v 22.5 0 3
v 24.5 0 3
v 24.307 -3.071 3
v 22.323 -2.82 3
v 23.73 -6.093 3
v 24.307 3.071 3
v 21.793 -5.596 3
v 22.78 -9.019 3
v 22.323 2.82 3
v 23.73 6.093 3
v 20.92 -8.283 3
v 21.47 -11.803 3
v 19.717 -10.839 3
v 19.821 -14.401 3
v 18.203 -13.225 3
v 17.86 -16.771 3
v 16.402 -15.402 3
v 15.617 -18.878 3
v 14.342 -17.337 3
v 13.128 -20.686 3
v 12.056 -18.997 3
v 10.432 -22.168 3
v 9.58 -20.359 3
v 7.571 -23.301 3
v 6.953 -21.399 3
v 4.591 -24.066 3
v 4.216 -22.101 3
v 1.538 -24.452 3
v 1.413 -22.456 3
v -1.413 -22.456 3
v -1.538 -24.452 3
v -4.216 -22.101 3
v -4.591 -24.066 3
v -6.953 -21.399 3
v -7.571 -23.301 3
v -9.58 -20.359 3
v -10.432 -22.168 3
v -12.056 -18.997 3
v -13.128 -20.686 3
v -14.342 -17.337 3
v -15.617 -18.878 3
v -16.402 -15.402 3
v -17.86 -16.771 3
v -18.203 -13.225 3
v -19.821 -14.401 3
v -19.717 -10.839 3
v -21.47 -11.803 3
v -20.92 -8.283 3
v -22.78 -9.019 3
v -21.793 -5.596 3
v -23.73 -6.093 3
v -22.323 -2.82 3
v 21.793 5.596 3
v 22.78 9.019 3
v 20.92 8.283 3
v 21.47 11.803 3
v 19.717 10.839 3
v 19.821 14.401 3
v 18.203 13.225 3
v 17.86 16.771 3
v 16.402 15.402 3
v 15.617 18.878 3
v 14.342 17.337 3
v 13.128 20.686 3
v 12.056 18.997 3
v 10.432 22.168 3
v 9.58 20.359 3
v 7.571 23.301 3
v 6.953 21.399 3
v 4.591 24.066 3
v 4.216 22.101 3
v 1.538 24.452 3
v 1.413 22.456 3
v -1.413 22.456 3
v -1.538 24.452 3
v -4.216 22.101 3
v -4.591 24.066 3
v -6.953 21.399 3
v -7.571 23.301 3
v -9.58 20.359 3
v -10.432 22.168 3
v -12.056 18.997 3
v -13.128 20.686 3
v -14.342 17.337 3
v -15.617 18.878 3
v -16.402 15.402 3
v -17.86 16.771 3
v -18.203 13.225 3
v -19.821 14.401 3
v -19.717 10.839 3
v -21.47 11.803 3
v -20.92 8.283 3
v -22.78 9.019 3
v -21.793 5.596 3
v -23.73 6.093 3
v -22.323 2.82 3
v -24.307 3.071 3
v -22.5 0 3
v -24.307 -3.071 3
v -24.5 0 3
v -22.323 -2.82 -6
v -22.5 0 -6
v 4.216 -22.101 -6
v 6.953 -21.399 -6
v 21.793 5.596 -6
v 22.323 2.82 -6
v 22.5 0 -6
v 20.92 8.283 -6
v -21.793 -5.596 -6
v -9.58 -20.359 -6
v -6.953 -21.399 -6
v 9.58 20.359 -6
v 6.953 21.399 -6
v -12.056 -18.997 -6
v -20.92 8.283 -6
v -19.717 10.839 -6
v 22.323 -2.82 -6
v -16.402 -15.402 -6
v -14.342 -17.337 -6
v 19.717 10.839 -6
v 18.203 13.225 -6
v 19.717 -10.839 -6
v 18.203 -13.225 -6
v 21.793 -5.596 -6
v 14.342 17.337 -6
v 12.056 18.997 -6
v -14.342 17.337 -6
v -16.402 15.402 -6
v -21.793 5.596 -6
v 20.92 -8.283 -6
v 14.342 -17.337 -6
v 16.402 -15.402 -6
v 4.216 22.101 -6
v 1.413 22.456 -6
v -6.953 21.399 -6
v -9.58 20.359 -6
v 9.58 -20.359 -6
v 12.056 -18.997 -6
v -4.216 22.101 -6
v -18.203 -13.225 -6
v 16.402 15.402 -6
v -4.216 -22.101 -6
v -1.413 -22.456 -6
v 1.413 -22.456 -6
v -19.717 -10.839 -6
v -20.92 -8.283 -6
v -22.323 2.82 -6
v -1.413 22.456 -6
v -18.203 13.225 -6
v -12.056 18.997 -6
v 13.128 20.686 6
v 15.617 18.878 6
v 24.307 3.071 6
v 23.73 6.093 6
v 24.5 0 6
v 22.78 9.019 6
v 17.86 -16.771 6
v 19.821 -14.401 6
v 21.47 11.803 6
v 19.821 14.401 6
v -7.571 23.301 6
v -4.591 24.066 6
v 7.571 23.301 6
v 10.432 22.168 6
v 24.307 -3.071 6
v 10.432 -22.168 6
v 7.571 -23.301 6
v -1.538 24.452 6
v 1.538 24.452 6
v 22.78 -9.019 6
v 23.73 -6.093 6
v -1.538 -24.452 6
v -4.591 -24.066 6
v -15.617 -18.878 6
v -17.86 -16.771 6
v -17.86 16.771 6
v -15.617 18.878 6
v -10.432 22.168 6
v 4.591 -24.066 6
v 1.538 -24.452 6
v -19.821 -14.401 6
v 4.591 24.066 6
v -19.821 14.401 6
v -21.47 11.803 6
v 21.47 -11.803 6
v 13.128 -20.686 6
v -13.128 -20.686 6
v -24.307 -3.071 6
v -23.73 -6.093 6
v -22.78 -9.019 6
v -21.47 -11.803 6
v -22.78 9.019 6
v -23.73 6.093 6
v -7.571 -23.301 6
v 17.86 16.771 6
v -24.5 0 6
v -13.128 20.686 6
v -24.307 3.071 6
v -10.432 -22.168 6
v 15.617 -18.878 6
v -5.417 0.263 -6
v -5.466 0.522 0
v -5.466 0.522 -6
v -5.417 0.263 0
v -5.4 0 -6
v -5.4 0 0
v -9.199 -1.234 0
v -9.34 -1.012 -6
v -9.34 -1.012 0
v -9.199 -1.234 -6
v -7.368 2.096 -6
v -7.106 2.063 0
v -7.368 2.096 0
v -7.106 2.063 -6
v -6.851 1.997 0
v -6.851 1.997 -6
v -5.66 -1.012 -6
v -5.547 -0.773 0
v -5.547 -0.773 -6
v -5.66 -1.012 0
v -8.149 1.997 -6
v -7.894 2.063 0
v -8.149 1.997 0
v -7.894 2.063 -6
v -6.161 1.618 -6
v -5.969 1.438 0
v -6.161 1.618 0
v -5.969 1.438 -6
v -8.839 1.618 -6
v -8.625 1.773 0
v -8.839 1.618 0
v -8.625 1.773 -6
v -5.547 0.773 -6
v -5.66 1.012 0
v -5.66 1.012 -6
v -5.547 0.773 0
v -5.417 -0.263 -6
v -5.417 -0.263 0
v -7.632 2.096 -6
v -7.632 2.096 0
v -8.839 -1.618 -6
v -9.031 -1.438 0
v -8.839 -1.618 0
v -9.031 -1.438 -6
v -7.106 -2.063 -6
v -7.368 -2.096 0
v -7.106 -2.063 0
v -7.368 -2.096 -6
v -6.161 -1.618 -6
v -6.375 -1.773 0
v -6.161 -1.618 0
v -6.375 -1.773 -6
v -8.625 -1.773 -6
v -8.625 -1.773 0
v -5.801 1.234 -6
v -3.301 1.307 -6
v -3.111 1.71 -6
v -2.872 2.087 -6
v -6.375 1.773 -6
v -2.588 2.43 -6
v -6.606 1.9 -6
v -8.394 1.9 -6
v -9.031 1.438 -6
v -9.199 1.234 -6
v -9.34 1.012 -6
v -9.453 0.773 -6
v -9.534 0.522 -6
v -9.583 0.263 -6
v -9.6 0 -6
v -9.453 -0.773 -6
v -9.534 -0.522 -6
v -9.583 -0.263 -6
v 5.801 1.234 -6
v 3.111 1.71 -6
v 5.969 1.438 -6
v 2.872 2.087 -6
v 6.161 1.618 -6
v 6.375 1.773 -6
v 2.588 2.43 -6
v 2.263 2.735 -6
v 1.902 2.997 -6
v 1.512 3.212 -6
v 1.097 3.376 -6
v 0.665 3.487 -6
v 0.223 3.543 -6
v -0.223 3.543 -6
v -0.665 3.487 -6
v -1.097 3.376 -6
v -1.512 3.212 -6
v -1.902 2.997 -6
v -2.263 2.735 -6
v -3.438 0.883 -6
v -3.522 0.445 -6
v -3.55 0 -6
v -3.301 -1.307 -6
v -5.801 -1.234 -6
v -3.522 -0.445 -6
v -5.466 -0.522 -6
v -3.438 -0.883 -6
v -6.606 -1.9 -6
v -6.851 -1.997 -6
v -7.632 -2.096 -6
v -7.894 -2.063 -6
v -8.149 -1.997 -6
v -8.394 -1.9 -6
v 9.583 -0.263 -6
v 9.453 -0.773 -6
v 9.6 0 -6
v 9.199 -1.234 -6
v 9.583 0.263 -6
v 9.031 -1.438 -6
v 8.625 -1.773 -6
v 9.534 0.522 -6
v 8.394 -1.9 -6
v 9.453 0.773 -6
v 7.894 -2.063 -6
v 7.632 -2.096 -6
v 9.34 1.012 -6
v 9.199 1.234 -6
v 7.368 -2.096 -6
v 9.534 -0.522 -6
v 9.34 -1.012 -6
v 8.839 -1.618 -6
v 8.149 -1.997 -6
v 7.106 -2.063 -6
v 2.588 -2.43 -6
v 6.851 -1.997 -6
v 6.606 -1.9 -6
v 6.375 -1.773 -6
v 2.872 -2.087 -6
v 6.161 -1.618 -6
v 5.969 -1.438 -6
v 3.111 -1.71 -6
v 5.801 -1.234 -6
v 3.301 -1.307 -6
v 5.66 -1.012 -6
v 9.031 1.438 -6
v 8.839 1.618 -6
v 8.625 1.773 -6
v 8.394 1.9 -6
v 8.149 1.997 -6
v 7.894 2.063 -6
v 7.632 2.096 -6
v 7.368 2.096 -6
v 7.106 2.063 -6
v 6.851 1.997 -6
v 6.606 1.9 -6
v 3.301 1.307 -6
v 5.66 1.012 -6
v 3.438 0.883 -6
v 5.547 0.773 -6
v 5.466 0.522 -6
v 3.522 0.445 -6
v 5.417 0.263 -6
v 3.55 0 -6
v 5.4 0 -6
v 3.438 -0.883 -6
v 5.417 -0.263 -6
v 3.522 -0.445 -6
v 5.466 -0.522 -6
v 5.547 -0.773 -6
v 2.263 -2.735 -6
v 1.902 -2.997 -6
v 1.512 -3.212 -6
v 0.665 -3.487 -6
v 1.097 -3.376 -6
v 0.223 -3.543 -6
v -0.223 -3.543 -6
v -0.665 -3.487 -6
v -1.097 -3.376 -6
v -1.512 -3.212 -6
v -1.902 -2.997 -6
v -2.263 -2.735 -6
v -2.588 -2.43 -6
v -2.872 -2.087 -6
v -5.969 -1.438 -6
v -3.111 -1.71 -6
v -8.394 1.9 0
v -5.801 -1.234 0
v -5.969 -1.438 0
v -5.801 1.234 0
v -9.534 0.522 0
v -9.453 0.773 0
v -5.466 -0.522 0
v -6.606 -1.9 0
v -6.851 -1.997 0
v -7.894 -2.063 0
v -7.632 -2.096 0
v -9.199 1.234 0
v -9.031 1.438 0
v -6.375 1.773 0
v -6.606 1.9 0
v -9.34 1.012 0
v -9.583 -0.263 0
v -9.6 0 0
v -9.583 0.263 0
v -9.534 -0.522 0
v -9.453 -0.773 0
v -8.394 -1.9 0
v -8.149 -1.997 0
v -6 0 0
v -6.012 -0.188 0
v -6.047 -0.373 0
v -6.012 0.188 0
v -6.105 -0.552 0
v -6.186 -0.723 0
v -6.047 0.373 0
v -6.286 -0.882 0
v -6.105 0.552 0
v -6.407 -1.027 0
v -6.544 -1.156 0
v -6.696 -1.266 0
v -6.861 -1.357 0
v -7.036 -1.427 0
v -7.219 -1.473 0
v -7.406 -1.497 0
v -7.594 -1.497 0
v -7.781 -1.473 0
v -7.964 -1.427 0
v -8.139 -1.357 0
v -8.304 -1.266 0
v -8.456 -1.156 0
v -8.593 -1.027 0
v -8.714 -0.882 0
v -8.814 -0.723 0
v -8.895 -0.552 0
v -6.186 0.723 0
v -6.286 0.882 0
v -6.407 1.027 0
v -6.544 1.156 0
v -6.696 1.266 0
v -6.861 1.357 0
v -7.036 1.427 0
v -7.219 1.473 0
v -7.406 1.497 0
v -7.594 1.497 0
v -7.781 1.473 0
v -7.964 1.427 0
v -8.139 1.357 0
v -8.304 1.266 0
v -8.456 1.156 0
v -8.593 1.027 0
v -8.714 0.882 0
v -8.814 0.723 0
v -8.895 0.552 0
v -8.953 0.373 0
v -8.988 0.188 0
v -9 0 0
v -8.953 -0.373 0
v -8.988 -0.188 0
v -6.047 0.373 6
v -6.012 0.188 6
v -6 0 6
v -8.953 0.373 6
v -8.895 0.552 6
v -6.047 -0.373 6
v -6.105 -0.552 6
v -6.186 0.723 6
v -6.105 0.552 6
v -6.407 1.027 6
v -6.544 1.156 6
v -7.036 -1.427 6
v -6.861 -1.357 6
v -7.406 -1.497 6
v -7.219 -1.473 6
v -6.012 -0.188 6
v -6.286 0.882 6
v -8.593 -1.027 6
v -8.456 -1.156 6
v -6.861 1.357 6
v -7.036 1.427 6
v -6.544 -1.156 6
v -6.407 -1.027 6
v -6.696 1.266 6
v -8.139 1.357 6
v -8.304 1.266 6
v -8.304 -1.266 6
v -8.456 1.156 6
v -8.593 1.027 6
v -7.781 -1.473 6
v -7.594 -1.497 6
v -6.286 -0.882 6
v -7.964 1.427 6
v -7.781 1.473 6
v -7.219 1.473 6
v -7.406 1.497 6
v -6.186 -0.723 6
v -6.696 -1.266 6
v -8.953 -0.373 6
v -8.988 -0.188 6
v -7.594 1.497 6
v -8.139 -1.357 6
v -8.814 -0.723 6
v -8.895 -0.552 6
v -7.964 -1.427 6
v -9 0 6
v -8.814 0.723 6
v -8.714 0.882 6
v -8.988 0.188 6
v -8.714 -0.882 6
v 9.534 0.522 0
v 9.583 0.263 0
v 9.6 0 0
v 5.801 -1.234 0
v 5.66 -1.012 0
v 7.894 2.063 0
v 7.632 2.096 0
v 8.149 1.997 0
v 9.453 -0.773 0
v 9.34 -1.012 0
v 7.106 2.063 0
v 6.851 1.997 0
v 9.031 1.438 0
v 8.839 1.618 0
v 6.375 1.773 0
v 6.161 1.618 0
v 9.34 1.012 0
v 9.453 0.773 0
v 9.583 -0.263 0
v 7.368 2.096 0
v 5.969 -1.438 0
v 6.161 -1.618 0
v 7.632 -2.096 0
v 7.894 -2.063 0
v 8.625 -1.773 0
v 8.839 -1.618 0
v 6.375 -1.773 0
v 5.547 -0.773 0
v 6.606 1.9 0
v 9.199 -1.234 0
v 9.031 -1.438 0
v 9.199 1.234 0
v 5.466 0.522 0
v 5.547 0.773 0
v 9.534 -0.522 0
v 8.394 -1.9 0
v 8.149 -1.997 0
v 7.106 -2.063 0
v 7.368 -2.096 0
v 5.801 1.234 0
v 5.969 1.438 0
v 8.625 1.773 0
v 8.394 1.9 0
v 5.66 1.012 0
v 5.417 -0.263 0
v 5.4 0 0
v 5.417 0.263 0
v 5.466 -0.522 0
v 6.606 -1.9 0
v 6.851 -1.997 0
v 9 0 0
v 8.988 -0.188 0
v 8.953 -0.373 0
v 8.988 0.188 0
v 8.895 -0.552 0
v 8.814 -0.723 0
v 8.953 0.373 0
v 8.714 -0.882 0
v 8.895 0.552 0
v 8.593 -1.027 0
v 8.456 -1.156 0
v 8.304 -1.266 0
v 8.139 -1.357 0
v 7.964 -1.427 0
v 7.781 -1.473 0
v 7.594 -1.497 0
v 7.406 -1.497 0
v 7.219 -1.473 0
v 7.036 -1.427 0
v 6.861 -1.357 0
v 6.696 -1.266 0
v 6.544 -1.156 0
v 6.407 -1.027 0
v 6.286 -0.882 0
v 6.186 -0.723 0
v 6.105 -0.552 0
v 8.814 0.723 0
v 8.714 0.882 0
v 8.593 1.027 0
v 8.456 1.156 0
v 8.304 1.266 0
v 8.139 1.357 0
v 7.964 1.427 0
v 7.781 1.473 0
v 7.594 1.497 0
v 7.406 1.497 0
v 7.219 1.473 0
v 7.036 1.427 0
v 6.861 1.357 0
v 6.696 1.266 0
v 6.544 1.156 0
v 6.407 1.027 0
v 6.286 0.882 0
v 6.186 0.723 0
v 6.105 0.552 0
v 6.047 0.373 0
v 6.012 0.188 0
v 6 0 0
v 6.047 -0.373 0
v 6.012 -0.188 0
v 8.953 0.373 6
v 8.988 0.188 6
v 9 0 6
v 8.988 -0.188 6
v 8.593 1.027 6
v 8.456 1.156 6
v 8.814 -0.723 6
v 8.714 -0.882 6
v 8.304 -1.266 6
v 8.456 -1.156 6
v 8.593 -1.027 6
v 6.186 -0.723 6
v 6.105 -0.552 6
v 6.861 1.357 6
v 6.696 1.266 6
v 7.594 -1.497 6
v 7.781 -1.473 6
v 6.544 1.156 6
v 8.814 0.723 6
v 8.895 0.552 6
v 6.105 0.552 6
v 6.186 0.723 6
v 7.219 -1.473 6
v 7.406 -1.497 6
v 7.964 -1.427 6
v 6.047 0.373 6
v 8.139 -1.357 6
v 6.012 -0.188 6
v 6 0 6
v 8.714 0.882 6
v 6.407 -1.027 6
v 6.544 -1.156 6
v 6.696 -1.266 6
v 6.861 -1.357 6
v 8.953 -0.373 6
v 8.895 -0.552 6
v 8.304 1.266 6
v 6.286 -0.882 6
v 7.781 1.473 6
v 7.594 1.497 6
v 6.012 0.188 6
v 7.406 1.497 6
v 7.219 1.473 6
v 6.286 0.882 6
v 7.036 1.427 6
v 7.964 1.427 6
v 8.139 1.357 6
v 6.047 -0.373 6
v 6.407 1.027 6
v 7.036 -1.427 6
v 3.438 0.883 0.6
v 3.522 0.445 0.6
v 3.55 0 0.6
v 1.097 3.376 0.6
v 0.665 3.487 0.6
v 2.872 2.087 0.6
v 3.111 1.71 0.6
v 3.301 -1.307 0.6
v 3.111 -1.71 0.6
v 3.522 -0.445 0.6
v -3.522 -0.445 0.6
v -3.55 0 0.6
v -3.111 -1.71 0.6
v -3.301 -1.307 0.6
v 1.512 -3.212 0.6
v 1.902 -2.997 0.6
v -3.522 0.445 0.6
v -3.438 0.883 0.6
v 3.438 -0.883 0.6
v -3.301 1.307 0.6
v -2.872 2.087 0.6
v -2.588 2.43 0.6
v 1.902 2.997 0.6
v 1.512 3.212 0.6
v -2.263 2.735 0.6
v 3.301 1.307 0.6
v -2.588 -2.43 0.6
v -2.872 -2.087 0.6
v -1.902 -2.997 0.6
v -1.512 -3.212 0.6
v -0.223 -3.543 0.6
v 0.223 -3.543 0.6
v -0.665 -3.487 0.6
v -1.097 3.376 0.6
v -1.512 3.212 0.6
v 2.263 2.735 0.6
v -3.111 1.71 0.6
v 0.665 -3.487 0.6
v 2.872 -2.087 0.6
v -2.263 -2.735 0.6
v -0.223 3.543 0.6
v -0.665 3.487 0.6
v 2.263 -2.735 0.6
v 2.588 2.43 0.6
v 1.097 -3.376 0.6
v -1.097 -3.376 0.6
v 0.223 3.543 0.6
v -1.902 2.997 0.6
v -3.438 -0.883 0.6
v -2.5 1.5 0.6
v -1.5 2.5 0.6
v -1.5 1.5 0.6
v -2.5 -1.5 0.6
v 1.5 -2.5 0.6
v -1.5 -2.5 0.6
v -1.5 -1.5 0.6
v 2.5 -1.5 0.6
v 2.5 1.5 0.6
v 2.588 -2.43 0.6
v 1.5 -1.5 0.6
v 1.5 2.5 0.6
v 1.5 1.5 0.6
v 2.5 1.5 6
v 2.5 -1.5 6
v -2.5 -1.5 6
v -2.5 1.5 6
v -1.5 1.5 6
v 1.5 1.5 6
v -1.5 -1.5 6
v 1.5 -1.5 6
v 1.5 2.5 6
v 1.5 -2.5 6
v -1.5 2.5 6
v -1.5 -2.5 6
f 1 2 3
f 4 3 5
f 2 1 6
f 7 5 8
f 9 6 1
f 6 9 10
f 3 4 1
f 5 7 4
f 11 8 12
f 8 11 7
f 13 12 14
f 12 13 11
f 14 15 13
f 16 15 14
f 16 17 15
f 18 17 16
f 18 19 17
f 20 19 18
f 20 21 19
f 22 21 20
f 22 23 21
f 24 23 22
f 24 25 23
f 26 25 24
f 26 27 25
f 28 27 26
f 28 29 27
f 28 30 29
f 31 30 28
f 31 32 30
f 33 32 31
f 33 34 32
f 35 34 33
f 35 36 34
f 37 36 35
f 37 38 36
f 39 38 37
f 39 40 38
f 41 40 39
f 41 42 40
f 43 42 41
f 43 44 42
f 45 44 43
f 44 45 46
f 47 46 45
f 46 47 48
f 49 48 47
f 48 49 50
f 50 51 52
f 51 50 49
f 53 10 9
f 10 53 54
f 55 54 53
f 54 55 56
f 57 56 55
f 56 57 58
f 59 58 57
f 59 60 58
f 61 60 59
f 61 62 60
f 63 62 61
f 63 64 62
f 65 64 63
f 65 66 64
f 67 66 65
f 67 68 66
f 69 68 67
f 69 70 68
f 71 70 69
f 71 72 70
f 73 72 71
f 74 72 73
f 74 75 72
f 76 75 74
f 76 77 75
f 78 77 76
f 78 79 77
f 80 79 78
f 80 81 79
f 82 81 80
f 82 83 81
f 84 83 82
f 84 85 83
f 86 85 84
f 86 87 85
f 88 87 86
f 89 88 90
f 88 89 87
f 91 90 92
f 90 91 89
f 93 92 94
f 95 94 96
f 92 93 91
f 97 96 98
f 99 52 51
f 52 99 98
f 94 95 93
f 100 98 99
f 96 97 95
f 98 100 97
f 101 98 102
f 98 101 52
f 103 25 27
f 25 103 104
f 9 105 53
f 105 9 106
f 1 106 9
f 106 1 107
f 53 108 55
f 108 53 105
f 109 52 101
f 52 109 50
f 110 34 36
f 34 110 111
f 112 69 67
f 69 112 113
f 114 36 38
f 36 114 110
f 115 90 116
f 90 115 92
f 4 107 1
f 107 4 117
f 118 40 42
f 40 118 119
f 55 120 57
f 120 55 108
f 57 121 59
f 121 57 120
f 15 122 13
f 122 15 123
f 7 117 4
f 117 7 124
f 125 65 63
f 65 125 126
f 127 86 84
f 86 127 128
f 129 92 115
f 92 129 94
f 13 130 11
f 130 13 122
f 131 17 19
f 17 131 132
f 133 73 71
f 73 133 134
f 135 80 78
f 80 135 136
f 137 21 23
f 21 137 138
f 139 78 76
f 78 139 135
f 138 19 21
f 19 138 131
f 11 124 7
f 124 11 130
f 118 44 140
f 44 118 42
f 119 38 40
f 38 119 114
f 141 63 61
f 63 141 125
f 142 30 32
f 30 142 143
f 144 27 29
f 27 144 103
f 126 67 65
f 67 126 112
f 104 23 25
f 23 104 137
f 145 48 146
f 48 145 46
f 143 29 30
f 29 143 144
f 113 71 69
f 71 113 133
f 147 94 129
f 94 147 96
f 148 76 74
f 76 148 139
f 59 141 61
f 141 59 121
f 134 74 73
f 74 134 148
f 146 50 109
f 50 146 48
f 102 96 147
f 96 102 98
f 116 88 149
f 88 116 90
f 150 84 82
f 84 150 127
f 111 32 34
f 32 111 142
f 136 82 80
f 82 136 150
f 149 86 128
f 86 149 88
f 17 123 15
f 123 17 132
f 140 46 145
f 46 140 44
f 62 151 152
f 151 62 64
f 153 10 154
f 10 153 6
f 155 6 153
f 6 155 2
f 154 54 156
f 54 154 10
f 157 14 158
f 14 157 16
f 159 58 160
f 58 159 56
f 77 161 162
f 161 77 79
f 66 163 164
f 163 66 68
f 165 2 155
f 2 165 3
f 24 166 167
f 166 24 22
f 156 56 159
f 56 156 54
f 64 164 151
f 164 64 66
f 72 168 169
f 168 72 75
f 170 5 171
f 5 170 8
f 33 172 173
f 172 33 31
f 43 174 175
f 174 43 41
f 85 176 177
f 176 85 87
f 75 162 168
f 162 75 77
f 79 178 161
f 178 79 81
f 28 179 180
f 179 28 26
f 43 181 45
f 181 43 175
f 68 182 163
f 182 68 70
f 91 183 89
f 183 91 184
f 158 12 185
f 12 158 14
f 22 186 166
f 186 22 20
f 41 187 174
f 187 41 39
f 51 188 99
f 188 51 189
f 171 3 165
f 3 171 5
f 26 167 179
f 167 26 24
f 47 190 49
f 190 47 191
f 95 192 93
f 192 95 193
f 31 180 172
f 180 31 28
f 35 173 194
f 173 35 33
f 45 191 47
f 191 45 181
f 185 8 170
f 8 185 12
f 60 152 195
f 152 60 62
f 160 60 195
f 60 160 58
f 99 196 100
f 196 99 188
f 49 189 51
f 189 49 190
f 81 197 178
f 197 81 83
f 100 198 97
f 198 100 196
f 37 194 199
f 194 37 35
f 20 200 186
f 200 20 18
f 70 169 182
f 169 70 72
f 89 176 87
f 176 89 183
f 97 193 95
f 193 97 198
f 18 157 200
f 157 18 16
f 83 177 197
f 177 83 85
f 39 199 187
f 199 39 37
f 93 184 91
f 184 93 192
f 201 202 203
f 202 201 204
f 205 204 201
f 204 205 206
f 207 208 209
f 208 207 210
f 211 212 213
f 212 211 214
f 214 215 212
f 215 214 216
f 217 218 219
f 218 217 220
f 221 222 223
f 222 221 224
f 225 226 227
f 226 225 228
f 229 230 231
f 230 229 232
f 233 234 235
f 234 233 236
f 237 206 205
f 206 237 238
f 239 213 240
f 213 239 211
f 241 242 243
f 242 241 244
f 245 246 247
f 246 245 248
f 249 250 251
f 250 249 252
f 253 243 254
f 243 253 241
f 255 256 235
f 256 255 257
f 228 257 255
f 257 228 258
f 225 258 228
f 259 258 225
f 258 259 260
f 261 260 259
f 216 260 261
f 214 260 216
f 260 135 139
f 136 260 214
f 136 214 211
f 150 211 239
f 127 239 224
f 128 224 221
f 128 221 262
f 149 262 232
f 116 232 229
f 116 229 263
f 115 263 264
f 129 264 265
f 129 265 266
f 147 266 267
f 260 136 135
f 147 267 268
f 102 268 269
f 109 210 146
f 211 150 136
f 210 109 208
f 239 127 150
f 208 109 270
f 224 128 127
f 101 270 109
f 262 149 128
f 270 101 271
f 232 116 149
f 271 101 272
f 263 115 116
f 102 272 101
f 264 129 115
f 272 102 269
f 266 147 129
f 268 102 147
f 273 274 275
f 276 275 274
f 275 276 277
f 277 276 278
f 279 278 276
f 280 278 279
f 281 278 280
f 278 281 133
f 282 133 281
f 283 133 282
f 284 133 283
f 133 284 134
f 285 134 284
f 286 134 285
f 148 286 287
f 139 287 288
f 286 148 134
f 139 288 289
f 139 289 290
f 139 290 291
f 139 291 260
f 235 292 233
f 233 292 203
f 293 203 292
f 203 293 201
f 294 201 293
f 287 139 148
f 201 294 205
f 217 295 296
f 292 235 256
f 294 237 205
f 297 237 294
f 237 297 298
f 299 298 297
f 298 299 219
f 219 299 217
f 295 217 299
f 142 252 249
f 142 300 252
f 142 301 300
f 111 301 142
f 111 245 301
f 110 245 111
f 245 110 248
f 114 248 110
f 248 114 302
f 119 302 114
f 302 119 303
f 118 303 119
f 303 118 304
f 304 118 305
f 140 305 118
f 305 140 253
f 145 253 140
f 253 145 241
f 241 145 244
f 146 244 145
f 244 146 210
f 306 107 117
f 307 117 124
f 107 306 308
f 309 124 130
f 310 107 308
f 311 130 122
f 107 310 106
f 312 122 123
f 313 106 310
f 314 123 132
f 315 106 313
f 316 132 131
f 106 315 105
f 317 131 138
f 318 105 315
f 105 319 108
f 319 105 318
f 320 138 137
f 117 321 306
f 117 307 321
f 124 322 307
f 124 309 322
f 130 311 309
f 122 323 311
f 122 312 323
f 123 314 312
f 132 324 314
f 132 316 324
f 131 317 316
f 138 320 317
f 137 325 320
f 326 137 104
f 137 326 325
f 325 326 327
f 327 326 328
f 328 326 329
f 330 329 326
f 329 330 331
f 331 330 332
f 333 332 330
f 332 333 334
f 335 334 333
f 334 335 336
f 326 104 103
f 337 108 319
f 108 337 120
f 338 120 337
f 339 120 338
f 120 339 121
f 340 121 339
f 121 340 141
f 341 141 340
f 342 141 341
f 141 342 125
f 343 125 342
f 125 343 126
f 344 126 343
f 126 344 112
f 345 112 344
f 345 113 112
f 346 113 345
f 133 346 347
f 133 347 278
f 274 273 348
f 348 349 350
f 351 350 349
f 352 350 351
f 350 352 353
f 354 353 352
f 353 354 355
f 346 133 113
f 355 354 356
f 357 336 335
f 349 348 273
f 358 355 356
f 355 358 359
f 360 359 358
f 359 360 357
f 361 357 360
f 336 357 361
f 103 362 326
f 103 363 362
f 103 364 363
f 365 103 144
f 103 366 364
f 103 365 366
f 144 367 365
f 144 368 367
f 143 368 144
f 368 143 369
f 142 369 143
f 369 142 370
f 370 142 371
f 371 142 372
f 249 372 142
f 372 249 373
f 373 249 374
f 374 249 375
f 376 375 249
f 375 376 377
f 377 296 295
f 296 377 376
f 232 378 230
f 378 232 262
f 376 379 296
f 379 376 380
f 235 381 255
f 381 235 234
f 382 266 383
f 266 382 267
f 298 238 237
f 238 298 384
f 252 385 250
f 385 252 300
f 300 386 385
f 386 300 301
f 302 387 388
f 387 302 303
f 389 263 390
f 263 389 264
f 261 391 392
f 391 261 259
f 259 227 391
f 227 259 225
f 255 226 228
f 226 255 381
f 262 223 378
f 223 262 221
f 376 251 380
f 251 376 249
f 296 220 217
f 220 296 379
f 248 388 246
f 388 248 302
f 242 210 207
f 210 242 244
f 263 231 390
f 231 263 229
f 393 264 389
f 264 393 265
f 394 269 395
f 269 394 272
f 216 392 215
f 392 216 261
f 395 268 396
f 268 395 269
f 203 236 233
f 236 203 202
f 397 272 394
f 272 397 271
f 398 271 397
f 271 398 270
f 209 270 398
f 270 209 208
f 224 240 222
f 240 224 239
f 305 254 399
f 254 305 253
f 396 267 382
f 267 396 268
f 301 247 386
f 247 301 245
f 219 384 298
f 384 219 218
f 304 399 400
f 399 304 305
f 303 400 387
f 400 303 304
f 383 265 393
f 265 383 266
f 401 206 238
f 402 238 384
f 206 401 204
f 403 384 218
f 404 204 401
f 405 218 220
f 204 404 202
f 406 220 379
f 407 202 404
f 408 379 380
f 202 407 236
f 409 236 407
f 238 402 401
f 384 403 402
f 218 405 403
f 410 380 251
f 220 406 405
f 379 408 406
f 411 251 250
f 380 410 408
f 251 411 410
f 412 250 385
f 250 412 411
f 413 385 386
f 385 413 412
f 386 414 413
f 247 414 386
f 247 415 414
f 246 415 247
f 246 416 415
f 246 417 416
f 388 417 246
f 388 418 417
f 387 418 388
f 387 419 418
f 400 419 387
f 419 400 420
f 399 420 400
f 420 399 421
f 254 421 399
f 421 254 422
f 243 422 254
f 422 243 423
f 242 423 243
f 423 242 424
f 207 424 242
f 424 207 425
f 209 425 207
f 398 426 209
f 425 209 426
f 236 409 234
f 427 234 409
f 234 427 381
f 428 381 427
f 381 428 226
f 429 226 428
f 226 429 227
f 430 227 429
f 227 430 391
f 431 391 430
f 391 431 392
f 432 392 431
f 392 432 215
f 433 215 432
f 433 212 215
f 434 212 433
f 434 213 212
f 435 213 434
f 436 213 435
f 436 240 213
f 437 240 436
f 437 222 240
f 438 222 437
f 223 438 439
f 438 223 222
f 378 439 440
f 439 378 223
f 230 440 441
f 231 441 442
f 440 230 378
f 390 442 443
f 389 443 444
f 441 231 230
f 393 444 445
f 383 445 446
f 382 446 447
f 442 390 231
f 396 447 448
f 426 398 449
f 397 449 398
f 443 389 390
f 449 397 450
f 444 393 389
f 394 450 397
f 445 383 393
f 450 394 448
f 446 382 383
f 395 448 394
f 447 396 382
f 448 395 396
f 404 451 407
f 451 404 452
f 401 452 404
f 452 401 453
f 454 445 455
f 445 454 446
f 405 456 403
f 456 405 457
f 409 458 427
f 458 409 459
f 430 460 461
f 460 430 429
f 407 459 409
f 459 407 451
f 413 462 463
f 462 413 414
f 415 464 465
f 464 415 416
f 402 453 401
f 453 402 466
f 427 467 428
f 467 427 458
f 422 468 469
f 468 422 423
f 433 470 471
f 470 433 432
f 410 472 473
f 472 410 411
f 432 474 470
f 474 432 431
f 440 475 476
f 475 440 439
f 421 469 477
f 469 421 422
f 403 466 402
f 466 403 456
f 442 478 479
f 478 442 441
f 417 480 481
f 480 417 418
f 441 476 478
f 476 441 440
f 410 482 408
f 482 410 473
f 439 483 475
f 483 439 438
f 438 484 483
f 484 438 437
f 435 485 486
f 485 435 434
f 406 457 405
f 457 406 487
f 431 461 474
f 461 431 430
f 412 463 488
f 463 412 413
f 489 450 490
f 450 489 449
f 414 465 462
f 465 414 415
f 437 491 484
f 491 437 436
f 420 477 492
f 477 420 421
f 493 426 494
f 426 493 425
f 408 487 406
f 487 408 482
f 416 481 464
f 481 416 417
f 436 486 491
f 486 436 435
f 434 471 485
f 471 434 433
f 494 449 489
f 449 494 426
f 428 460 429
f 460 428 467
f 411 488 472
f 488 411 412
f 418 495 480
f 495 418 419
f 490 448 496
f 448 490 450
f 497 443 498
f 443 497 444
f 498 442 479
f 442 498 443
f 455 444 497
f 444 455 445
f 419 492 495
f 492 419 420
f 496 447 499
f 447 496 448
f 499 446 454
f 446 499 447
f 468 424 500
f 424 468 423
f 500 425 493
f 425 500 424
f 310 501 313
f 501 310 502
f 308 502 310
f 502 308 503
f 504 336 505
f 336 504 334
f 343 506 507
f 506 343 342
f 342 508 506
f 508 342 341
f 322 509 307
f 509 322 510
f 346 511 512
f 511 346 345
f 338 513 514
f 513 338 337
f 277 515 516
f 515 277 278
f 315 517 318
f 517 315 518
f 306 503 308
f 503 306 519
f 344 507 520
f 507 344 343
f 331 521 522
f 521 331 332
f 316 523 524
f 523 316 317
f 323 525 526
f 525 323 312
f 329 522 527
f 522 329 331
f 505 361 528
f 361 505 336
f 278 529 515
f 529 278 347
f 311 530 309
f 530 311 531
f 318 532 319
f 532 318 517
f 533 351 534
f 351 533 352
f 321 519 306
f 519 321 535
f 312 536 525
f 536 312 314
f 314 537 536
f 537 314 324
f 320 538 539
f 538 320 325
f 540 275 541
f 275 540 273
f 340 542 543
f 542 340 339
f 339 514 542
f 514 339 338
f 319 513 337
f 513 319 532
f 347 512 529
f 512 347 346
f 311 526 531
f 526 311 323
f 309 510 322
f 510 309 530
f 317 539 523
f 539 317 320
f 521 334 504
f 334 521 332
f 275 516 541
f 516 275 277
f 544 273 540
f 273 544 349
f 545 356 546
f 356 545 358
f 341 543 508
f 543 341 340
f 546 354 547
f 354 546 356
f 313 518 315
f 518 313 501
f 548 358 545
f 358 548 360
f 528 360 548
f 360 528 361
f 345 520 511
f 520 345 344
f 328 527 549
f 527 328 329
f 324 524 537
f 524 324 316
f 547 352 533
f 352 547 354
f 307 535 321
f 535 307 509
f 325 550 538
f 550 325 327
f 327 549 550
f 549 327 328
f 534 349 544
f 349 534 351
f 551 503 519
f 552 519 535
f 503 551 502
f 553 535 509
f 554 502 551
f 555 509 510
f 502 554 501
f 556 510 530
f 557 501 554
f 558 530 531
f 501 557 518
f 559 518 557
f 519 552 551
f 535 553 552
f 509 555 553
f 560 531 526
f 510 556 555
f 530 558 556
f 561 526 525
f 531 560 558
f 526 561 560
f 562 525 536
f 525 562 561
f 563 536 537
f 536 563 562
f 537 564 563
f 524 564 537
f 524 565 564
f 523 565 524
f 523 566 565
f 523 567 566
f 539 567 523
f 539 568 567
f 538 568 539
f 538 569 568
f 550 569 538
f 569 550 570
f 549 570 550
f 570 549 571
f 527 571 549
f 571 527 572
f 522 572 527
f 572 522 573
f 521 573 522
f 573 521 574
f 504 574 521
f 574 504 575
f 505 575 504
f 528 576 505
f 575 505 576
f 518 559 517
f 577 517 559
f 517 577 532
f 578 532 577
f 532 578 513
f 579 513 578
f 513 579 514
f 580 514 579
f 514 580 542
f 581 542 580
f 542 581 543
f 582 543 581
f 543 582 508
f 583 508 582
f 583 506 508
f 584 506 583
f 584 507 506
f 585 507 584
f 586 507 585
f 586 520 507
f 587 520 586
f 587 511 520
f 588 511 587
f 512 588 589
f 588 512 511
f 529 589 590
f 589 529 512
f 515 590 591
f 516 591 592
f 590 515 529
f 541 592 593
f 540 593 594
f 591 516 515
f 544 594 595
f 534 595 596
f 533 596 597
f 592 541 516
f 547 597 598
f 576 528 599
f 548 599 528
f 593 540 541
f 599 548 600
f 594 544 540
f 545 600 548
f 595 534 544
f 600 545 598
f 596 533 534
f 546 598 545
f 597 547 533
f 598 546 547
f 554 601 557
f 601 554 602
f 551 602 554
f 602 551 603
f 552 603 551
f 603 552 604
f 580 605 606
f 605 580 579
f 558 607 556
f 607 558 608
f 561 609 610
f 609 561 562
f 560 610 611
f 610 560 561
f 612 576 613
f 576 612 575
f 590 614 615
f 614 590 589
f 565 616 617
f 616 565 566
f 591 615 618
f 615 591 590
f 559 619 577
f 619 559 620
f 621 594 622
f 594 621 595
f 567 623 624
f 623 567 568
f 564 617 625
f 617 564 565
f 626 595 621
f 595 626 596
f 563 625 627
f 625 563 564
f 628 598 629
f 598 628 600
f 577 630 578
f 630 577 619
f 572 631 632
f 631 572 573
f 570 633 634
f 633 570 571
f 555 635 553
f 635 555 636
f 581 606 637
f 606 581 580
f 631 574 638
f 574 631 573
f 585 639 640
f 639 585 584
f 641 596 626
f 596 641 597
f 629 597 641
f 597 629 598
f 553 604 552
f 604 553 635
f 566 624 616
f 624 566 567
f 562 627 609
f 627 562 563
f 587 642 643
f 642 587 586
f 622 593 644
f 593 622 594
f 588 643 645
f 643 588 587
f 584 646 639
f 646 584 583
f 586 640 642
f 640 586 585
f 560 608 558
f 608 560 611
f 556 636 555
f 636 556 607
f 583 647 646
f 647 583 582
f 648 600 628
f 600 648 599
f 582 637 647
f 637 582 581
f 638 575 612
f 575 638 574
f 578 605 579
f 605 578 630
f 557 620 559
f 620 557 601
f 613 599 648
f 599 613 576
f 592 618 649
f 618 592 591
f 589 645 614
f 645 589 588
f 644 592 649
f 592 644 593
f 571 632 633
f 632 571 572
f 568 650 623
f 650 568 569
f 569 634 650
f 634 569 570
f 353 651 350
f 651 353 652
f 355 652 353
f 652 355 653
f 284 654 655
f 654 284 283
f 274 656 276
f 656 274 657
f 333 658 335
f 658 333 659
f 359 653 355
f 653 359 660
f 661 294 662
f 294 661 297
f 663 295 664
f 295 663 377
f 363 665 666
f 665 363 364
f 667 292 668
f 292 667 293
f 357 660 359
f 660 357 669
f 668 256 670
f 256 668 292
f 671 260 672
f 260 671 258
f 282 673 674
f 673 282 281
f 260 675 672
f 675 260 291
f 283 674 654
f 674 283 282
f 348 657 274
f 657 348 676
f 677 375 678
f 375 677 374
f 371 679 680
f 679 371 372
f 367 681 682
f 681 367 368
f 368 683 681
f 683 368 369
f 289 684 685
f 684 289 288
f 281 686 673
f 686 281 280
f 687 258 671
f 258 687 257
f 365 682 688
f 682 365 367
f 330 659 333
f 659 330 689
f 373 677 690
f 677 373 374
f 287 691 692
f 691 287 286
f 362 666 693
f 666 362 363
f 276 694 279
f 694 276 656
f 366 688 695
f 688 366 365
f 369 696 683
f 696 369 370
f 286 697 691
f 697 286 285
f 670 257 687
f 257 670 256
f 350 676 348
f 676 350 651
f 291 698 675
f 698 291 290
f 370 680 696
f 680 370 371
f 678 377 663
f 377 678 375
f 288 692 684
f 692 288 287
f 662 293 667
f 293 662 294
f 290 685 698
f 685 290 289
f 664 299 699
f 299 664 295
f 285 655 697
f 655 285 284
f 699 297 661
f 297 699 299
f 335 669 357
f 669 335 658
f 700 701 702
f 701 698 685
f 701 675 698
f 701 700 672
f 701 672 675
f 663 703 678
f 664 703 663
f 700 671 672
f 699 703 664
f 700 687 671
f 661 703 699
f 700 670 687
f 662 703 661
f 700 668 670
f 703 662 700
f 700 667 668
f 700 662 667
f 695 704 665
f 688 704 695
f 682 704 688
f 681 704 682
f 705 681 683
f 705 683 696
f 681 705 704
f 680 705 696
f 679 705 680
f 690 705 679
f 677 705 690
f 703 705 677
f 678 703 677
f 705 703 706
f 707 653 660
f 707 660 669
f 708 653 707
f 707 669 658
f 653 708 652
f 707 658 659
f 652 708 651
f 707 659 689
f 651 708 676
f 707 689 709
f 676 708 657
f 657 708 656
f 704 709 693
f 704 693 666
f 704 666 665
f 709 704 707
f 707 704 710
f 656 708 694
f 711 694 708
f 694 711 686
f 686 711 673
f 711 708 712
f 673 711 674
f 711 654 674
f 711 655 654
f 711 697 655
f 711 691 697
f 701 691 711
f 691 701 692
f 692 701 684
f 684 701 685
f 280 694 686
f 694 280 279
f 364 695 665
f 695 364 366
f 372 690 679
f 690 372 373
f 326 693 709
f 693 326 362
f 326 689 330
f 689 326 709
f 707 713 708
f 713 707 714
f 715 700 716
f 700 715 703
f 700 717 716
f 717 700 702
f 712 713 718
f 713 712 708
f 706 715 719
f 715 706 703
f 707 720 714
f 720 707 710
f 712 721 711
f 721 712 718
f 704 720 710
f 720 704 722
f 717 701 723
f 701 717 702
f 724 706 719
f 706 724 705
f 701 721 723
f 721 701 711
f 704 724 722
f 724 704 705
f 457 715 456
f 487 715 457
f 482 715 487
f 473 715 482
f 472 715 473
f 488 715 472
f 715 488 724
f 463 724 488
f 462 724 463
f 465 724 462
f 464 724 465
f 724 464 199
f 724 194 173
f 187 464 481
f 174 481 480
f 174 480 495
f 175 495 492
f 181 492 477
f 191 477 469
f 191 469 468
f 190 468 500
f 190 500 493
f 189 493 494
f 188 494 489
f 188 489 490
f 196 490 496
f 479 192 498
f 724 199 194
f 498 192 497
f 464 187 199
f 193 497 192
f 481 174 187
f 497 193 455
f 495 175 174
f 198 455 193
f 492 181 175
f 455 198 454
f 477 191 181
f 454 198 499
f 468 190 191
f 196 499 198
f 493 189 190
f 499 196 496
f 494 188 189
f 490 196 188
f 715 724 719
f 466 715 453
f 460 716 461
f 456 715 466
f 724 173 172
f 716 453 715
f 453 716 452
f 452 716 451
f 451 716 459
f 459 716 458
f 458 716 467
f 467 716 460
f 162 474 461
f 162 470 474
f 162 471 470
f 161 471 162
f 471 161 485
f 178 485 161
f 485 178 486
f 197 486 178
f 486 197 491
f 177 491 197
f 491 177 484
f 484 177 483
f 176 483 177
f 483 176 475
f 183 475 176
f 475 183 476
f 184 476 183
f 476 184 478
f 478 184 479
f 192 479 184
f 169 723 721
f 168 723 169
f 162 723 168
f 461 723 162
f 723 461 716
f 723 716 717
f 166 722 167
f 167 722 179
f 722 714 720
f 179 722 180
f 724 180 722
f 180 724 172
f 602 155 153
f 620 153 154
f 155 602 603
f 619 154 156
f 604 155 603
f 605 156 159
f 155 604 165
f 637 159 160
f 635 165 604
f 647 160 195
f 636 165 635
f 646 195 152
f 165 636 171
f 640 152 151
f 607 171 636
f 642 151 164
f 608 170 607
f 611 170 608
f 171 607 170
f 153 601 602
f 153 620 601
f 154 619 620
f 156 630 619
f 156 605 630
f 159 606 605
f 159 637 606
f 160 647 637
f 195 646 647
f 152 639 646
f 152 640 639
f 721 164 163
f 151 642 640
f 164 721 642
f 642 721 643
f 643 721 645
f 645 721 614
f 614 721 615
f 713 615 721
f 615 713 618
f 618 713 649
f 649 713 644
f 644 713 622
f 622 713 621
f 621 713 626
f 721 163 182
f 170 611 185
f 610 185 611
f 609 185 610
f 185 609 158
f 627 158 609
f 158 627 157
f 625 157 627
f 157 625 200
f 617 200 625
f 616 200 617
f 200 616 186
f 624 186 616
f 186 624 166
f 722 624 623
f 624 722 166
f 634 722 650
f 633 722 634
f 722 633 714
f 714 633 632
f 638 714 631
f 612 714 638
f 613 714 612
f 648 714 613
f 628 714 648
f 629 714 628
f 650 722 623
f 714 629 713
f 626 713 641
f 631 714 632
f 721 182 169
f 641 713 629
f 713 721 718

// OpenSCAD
$fn = 50;

difference() {
	union() {
		translate(v = [0, 0, 0]) {
			rotate(a = [0, 0, 0]) {
				difference() {
					union() {
						translate(v = [0, 0, -6.0]) {
							cylinder(h = 12, r = 24.5);
						}
					}
					union() {
						translate(v = [0, 0, 0]) {
							rotate(a = [0, 0, 0]) {
								difference() {
									union() {
										translate(v = [0, 0, -3.0]) {
											cylinder(h = 6, r = 27.5);
										}
									}
									union() {
										translate(v = [0, 0, -3.01]) {
											cylinder(h = 6.02, r = 22.5);
										}
									}
								}
							}
						}
						translate(v = [0, 0, -3]) {
							rotate(a = [0, 0, 0]) {
								difference() {
									union() {
										translate(v = [0, 0, -3.0]) {
											cylinder(h = 6, r = 27.5);
										}
									}
									union() {
										translate(v = [0, 0, -3.01]) {
											cylinder(h = 6.02, r = 22.5);
										}
									}
								}
							}
						}
						translate(v = [0, 0, -6]) {
							rotate(a = [0, 0, 0]) {
								difference() {
									union() {
										translate(v = [0, 0, -3.0]) {
											cylinder(h = 6, r = 27.5);
										}
									}
									union() {
										translate(v = [0, 0, -3.01]) {
											cylinder(h = 6.02, r = 22.5);
										}
									}
								}
							}
						}
						translate(v = [0, 0, 0]) {
							rotate(a = [0, 0, 0]) {
								difference() {
									union() {
										translate(v = [0, 0, -21.0]) {
											cylinder(h = 42, r = 25.5);
										}
									}
									union() {
										translate(v = [0, 0, -21.01]) {
											cylinder(h = 42.02, r = 24.5);
										}
									}
								}
							}
						}
						translate(v = [-30.0, -30.0, -100.0]) {
							cylinder(h = 200, r = 3.0);
						}
						translate(v = [-30.0, -15.0, -100.0]) {
							cylinder(h = 200, r = 3.0);
						}
						translate(v = [-30.0, 15.0, -100.0]) {
							cylinder(h = 200, r = 3.0);
						}
						translate(v = [-30.0, 30.0, -100.0]) {
							cylinder(h = 200, r = 3.0);
						}
						translate(v = [-15.0, -30.0, -100.0]) {
							cylinder(h = 200, r = 3.0);
						}
						translate(v = [-15.0, 30.0, -100.0]) {
							cylinder(h = 200, r = 3.0);
						}
						translate(v = [15.0, -30.0, -100.0]) {
							cylinder(h = 200, r = 3.0);
						}
						translate(v = [15.0, 30.0, -100.0]) {
							cylinder(h = 200, r = 3.0);
						}
						translate(v = [30.0, -30.0, -100.0]) {
							cylinder(h = 200, r = 3.0);
						}
						translate(v = [30.0, -15.0, -100.0]) {
							cylinder(h = 200, r = 3.0);
						}
						translate(v = [30.0, 15.0, -100.0]) {
							cylinder(h = 200, r = 3.0);
						}
						translate(v = [30.0, 30.0, -100.0]) {
							cylinder(h = 200, r = 3.0);
						}
						translate(v = [-7.5, 0, -6.0]) {
							cylinder(h = 6, r = 2.1);
						}
						translate(v = [-7.5, 0, -7.0]) {
							cylinder(h = 14, r = 1.5);
						}
						translate(v = [7.5, 0, -6.0]) {
							cylinder(h = 6, r = 2.1);
						}
						translate(v = [7.5, 0, -7.0]) {
							cylinder(h = 14, r = 1.5);
						}
						translate(v = [0, 0, -6.000000000000001]) {
							cylinder(h = 6.6, r = 3.55);
						}
						translate(v = [-2.5, -1.5, -7.0]) {
							cube(size = [5, 3, 14]);
						}
						translate(v = [-1.5, -2.5, -7.0]) {
							cube(size = [3, 5, 14]);
						}
					}
				}
			}
		}
	}
	union();
}
